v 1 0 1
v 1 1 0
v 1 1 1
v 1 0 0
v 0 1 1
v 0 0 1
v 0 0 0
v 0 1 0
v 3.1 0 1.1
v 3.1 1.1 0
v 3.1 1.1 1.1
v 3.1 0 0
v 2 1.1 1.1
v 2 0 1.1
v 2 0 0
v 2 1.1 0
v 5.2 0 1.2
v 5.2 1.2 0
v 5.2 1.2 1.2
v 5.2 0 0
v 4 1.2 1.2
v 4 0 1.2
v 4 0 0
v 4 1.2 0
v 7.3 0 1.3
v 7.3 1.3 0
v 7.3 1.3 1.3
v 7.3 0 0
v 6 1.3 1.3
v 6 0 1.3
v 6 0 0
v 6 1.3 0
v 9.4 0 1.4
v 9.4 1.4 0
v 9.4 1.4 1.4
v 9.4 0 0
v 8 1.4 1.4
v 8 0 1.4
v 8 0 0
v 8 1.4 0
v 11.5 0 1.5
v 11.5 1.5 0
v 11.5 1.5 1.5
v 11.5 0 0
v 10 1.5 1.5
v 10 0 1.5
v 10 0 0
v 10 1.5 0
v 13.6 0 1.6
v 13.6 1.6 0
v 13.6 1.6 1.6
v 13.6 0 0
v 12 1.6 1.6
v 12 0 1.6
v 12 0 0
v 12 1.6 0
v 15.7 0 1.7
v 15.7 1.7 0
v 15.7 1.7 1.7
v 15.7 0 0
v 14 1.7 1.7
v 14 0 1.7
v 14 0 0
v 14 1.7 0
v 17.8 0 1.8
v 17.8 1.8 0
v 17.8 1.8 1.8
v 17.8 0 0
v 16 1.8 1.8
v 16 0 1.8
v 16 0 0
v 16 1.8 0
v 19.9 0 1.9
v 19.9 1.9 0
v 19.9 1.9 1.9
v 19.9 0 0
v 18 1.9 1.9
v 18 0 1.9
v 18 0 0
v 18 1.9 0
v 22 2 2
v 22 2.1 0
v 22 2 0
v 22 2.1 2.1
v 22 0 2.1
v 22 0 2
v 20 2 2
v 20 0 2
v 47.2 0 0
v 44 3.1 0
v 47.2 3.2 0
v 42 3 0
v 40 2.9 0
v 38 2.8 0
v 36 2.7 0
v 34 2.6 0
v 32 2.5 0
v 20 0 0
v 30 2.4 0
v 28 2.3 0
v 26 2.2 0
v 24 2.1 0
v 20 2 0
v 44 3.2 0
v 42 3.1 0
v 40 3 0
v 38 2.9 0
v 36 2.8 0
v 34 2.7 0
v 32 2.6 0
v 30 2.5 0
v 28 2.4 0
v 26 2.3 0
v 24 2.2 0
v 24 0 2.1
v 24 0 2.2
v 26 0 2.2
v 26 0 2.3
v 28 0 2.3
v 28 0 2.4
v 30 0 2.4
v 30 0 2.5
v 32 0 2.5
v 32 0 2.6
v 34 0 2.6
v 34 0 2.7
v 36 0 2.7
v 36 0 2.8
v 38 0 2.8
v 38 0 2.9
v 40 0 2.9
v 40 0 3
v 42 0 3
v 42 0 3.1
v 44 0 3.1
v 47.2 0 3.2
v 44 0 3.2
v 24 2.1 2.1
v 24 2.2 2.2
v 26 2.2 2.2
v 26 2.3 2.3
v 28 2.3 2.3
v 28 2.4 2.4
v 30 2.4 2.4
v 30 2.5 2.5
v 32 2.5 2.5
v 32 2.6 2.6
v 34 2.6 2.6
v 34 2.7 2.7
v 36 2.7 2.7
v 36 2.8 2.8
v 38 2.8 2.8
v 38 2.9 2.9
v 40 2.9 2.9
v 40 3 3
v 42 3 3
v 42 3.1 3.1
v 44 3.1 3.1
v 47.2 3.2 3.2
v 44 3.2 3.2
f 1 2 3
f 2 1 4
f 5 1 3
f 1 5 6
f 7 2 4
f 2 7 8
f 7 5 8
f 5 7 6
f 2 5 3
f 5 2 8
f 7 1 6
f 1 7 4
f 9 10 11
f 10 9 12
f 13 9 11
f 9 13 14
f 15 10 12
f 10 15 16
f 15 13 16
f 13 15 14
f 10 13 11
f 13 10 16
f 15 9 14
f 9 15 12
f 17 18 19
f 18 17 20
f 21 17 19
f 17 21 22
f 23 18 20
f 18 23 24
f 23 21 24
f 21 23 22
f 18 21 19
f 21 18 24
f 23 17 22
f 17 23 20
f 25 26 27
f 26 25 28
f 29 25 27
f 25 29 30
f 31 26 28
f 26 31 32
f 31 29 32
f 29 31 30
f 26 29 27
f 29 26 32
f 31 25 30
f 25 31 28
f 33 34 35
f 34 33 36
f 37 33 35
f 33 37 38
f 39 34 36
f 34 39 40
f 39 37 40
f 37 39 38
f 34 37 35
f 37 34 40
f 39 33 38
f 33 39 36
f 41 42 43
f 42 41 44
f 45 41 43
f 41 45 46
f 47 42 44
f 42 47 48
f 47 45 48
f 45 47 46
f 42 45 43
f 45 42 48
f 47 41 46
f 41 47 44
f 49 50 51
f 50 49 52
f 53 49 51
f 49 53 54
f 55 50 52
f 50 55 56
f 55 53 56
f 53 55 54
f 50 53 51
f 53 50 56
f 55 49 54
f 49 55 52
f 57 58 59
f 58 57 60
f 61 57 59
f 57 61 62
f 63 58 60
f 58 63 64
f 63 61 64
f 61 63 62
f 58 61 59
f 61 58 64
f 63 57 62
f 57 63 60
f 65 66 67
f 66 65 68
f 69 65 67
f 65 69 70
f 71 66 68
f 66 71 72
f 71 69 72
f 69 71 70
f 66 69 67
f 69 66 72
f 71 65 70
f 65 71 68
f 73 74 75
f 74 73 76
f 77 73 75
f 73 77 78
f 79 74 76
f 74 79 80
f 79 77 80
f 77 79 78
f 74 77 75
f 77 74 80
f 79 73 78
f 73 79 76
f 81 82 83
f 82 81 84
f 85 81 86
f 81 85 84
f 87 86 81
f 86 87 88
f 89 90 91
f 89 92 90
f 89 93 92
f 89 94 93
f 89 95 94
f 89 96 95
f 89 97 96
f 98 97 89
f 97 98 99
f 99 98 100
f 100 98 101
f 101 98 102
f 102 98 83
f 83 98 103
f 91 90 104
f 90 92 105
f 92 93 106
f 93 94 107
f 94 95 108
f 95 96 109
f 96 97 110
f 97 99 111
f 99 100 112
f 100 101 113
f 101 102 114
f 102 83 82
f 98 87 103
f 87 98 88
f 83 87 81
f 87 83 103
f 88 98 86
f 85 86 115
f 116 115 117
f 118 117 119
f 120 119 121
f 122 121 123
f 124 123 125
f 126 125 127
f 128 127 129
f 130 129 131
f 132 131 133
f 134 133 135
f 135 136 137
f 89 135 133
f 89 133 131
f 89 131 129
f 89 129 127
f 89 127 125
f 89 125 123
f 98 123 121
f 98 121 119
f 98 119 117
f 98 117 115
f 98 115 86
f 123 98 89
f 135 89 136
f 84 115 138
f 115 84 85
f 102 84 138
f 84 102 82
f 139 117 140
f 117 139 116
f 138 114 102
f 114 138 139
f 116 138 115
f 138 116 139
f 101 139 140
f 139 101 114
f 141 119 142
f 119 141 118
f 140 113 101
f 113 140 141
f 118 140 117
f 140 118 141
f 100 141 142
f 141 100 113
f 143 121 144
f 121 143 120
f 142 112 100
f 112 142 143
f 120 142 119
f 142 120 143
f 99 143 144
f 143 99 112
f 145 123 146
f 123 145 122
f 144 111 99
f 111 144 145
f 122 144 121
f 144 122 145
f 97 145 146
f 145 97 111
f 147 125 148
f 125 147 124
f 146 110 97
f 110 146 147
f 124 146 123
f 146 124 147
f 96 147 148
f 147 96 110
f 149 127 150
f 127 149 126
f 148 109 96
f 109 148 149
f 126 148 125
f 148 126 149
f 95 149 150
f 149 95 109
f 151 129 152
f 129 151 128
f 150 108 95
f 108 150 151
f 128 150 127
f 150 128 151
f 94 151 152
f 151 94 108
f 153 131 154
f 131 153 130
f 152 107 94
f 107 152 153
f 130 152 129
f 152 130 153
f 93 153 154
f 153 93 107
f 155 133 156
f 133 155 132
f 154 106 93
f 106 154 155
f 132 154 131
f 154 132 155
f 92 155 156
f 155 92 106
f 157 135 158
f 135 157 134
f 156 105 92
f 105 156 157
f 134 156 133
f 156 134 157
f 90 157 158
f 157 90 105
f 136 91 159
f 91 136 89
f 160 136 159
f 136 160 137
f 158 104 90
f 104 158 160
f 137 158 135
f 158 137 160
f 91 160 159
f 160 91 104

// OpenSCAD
color("#f00") cube(1);
translate([2,0,0]) color("#00FF00") cube(1.1);
translate([4,0,0]) color("#0000ff80") cube(1.2);
translate([6,0,0]) color("#f008") cube(1.3);
translate([8,0,0]) color([0.5, 0.2, 0.1]) cube(1.4);
translate([10,0,0]) color([0.5, 0.2, 0.1, 0.3]) cube(1.5);
translate([12,0,0]) color("teal", alpha = 0.5) cube(1.6);
translate([14,0,0]) color([255, 0, 0]) cube(1.7);
translate([16,0,0]) color([1, 2]) cube(1.8);
translate([18,0,0]) color(5) cube(1.9);
translate([20,0,0]) color("#12345") cube(2.0);
translate([22,0,0]) color("#ggg") cube(2.1);
translate([24,0,0]) color([1,0,0,1,1]) cube(2.2);
translate([26,0,0]) color("red", alpha = 2) cube(2.3);
translate([28,0,0]) color("transparent") cube(2.4);
translate([30,0,0]) color(c = "blue") cube(2.5);
translate([32,0,0]) color("red", 0.5) cube(2.6);
translate([34,0,0]) color(undef) cube(2.7);
translate([36,0,0]) color([-1, 0.5, 0.5]) cube(2.8);
translate([38,0,0]) color("red", alpha = -1) cube(2.9);
translate([40,0,0]) color("red", alpha = "x") cube(3.0);
translate([42,0,0]) color("red", foo = 1) cube(3.1);
translate([44,0,0]) color() cube(3.2);
